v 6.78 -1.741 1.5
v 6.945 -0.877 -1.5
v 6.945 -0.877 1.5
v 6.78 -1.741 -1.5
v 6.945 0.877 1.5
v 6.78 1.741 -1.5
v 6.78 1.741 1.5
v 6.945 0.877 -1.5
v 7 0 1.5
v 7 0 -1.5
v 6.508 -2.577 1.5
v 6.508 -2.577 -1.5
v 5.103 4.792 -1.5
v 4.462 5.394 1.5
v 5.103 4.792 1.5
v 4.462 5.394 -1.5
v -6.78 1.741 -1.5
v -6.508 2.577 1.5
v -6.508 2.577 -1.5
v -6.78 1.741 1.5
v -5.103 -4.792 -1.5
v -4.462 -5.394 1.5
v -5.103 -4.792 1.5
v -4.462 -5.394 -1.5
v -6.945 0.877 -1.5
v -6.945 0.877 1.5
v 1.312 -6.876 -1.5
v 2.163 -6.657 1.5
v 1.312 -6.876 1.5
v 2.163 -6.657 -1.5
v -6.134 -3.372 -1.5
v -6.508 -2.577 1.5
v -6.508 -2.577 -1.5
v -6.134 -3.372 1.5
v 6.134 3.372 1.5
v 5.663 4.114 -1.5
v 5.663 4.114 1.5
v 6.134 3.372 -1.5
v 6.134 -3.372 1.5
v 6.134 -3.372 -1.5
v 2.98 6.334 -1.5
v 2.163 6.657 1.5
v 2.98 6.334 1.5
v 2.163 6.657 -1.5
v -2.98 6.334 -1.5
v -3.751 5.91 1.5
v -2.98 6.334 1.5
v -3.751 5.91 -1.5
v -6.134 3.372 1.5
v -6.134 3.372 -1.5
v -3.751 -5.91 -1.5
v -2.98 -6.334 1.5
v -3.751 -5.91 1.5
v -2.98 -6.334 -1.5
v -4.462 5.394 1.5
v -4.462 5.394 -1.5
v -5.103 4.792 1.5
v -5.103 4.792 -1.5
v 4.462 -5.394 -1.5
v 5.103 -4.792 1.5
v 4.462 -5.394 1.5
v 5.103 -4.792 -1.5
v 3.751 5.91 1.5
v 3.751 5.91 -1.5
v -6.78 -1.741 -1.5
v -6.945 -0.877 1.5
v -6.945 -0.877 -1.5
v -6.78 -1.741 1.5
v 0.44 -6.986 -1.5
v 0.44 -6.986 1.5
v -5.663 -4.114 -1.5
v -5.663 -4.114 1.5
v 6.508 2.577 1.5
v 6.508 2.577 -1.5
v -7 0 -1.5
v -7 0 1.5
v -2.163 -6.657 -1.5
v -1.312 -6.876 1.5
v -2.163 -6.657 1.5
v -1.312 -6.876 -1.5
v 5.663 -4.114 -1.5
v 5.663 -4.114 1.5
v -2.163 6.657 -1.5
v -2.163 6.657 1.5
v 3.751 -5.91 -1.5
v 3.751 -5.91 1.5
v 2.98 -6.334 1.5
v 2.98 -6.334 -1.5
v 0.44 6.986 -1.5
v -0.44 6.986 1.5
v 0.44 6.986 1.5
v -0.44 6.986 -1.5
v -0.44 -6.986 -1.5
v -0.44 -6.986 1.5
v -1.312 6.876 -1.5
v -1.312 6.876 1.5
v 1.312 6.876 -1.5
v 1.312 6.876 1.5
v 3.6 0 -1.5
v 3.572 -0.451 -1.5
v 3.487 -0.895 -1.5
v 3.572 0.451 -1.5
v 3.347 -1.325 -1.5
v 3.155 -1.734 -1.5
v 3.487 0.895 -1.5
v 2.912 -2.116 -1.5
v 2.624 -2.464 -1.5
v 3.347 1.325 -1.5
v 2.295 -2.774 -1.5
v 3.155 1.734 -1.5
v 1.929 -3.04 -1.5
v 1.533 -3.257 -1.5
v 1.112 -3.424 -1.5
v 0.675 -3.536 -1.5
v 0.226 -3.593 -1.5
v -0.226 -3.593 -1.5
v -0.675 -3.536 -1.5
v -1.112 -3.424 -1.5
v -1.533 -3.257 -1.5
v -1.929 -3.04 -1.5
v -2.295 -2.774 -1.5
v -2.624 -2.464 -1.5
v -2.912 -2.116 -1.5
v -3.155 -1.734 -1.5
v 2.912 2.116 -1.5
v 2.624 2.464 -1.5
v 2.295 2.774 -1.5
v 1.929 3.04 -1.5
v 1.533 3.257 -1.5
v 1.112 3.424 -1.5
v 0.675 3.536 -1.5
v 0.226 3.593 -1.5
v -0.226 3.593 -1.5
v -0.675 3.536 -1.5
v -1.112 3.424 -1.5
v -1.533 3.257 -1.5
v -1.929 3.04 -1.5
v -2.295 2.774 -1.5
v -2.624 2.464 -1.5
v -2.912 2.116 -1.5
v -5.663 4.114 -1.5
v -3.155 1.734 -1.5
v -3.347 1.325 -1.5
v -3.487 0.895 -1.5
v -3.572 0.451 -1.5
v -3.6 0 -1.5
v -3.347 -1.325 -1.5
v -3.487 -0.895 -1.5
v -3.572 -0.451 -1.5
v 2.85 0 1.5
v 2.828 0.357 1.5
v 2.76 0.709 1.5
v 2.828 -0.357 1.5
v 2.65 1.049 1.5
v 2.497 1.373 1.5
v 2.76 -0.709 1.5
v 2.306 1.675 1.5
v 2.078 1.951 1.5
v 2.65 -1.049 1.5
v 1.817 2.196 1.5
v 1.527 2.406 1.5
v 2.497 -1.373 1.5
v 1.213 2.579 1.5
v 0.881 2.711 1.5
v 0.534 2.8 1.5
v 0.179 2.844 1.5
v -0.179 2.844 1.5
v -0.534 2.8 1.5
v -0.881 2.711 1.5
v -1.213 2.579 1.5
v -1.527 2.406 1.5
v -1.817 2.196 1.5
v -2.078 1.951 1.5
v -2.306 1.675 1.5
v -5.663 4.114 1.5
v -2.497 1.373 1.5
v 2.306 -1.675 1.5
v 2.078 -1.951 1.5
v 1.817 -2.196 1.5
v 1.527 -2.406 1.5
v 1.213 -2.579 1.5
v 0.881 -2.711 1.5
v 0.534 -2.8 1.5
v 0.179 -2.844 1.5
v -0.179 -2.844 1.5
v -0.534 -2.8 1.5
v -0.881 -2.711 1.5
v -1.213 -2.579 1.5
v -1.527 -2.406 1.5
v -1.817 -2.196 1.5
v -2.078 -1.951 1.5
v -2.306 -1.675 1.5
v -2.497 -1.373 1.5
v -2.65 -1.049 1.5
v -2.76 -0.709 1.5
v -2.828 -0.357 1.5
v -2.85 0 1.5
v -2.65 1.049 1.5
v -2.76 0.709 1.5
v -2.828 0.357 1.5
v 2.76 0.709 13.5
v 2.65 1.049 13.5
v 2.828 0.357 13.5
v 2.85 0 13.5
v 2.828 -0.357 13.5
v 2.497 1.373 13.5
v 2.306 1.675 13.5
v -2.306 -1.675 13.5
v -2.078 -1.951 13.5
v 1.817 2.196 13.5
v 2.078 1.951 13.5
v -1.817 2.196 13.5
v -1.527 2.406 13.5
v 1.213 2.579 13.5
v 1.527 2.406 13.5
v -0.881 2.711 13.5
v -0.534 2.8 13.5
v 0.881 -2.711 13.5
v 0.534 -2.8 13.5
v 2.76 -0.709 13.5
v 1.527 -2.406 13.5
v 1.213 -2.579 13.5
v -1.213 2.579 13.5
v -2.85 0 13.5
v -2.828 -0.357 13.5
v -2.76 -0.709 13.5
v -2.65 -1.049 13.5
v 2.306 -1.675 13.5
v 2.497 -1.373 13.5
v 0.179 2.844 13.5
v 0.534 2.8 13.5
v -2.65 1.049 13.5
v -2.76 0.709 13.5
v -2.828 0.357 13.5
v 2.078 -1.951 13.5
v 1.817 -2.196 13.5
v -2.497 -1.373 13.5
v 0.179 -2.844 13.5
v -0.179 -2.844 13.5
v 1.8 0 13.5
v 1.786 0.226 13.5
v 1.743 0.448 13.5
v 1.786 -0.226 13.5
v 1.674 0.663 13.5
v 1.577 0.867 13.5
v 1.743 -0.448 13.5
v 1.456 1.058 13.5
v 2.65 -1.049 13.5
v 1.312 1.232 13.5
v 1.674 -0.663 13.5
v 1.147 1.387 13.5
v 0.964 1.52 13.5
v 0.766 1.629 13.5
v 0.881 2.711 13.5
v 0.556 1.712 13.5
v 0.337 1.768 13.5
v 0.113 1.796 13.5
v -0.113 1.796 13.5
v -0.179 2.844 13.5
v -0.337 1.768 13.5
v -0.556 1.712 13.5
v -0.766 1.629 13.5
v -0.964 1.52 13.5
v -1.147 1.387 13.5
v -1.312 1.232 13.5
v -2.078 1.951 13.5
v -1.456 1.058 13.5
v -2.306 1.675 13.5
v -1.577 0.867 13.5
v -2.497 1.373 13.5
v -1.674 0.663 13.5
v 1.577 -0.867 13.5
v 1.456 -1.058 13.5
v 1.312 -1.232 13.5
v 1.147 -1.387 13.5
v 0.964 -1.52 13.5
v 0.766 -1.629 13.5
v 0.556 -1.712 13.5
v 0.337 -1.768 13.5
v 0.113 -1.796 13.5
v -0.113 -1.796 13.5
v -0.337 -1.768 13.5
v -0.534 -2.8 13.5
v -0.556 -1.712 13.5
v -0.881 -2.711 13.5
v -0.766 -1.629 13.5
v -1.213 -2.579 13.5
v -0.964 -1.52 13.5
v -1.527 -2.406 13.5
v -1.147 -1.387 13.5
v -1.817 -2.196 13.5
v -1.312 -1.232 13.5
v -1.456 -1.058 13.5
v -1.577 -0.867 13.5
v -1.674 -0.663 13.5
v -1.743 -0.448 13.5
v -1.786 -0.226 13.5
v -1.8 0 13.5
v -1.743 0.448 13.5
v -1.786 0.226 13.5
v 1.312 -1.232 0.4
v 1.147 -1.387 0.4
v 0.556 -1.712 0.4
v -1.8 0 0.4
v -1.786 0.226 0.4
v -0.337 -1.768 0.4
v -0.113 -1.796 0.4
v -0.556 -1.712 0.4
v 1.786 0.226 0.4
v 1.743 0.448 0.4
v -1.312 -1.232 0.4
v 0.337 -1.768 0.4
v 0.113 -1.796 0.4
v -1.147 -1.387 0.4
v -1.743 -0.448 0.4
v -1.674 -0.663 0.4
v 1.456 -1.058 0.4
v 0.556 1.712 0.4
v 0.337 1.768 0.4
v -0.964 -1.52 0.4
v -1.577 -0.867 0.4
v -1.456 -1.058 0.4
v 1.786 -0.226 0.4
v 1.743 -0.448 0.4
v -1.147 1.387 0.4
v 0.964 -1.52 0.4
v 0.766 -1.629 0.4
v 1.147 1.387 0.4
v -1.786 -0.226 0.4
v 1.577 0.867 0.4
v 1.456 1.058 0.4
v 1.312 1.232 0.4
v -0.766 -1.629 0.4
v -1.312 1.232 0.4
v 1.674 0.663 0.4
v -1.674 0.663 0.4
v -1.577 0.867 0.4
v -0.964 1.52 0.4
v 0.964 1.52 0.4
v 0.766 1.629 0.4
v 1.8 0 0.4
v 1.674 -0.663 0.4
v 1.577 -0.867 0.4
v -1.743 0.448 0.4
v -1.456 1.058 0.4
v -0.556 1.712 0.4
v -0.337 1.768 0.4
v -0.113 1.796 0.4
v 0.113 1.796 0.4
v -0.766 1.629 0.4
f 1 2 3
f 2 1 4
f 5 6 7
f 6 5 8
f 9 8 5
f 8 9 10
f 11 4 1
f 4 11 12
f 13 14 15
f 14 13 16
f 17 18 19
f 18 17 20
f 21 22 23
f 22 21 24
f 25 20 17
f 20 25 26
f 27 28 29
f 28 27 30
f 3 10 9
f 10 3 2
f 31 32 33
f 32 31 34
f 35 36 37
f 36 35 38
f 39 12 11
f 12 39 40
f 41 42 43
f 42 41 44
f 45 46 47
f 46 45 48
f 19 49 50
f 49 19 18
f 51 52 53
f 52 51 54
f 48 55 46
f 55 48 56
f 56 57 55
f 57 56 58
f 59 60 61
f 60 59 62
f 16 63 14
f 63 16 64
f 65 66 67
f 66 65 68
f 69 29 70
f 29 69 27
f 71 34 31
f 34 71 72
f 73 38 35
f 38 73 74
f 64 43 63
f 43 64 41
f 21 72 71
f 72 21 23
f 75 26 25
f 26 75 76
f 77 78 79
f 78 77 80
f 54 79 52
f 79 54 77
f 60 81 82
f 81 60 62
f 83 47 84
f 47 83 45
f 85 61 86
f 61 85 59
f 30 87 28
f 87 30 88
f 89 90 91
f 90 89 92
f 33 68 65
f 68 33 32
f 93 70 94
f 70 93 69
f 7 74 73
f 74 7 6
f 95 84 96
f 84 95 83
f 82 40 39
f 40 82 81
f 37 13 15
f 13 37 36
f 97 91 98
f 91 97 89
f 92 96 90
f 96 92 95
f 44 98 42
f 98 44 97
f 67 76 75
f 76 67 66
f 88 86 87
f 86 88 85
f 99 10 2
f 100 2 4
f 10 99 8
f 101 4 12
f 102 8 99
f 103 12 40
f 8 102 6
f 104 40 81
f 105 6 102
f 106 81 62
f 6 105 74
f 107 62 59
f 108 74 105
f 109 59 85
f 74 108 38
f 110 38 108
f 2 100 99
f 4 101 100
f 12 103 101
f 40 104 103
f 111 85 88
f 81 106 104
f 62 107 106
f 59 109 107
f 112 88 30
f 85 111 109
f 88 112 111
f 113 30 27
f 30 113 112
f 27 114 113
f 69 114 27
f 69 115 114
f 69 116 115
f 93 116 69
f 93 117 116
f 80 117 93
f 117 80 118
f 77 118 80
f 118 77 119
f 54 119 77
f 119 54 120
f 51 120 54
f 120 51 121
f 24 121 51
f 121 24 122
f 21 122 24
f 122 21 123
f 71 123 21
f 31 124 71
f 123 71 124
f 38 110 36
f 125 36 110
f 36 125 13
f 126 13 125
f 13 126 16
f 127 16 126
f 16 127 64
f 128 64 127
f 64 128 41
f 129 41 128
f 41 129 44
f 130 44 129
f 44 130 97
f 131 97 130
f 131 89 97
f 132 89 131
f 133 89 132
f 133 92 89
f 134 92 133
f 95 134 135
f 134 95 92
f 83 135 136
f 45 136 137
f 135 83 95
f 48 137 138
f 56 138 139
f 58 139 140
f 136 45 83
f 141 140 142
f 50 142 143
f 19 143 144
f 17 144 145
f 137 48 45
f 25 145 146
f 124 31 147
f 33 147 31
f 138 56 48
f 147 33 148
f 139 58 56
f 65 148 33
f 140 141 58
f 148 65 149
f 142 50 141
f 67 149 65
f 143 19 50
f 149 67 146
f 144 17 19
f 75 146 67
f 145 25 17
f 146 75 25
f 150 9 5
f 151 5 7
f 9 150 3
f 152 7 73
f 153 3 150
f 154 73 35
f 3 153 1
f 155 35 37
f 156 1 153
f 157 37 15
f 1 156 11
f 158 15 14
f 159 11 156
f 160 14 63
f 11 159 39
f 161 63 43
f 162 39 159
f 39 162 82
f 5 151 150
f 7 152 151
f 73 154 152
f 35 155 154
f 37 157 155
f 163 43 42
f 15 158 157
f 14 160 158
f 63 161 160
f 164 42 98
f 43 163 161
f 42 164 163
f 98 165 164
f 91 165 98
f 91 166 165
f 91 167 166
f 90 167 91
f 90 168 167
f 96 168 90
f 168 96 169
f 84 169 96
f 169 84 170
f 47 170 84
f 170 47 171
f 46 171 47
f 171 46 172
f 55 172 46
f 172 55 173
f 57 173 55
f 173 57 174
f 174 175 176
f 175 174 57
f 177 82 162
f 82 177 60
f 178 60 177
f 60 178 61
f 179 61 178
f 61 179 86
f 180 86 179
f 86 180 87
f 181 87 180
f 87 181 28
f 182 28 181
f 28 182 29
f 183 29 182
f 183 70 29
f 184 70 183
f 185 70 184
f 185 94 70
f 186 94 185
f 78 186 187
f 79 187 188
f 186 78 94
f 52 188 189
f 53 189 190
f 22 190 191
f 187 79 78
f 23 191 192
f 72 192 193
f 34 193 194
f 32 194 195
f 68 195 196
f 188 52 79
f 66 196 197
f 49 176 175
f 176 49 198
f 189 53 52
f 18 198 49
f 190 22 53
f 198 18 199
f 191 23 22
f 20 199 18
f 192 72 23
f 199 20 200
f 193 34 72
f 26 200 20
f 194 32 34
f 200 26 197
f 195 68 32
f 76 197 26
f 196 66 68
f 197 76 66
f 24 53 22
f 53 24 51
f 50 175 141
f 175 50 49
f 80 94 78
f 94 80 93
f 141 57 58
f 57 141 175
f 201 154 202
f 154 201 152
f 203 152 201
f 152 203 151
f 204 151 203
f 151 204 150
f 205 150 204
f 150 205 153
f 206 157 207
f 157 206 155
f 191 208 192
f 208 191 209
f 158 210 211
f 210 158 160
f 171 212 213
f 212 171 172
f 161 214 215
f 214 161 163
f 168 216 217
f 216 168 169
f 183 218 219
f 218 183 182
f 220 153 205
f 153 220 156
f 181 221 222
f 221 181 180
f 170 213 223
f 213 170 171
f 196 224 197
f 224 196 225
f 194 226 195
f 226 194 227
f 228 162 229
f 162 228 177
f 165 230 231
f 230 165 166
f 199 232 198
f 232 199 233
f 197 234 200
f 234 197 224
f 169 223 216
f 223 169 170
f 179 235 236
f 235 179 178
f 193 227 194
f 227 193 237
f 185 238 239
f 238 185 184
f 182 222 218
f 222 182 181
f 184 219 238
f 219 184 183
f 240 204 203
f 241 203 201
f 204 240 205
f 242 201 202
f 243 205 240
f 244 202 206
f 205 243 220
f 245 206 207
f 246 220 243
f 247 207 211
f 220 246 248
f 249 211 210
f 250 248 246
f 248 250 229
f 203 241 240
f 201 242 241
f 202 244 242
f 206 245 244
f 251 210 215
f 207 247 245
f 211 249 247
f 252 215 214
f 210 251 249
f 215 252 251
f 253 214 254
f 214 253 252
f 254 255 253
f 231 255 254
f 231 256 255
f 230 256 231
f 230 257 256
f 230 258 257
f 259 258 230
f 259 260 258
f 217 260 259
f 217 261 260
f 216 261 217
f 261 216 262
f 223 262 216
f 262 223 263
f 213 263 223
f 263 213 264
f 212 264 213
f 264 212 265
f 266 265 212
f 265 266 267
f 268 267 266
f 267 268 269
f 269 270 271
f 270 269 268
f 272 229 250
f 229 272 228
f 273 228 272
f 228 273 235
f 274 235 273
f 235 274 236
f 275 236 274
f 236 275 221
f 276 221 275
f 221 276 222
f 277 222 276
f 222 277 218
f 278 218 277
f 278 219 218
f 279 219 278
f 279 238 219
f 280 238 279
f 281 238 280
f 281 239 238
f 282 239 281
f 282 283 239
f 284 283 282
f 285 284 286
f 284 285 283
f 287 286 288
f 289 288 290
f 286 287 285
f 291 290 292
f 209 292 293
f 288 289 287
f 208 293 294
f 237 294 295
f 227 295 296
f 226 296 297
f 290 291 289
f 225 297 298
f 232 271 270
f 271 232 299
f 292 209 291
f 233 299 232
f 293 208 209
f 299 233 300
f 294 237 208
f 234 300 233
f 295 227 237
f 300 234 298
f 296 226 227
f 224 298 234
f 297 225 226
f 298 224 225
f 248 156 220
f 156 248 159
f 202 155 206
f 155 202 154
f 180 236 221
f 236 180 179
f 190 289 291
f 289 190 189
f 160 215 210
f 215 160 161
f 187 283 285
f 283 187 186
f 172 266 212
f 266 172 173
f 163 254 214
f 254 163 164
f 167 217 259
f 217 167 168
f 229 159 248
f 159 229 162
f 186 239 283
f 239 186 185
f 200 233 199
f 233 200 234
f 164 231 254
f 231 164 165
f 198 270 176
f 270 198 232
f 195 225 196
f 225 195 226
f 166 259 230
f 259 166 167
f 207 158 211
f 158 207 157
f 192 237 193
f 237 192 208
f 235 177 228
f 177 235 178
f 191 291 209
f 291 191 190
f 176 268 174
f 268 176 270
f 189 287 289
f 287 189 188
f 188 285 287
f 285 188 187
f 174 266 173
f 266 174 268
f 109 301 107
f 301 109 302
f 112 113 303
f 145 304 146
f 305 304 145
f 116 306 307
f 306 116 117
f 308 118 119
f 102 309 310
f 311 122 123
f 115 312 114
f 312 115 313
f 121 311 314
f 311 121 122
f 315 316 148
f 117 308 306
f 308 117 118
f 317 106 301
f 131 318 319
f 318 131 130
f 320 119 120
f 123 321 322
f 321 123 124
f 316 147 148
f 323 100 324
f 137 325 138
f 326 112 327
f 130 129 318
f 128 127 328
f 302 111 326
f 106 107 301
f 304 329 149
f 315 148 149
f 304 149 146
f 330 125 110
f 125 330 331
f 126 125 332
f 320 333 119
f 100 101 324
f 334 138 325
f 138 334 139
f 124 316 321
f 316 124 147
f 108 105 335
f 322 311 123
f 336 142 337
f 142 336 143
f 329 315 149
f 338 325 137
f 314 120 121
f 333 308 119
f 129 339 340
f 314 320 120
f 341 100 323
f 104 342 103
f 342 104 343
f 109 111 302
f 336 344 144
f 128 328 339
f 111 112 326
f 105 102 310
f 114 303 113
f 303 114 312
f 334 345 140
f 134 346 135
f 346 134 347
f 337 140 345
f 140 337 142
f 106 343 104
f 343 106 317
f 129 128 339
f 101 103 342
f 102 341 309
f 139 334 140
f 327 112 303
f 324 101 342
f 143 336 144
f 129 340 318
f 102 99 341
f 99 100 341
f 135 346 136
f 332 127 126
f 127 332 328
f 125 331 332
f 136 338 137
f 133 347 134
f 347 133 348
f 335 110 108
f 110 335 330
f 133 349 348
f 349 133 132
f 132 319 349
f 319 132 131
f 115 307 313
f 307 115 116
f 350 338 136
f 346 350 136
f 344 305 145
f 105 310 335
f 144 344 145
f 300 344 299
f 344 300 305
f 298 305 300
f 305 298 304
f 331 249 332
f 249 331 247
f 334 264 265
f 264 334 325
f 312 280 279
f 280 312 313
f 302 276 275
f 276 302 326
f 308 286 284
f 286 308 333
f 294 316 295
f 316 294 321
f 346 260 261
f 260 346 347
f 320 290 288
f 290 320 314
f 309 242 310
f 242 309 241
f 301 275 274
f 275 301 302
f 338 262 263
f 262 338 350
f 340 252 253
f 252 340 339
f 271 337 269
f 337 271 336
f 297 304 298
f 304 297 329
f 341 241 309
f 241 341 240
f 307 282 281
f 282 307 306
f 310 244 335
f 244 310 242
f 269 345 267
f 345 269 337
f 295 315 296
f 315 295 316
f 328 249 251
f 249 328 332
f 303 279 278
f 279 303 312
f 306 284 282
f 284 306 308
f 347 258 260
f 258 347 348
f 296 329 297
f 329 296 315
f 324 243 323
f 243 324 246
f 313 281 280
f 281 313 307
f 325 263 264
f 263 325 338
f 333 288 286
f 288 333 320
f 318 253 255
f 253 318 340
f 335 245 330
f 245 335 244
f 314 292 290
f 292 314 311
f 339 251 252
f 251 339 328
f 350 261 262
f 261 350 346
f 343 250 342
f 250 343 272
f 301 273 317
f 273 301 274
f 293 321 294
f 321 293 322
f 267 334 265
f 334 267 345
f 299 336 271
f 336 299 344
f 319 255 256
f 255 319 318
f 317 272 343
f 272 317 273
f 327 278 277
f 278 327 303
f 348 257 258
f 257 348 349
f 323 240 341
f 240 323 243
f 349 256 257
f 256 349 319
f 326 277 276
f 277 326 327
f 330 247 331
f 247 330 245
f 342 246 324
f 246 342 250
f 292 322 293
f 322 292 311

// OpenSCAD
$fn = 50;


difference() {
	union() {
		translate(v = [0, 0, -1.5000000000]) {
			cylinder(h = 3, r = 7.0000000000);
		}
		translate(v = [0, 0, -1.5000000000]) {
			cylinder(h = 15, r = 2.8500000000);
		}
	}
	union() {
		translate(v = [0, 0, -1.5000000000]) {
			rotate(a = [0, 180, 0]) {
				difference() {
					union() {
						translate(v = [0, 0, -15.0000000000]) {
							cylinder(h = 15, r = 1.5000000000);
						}
						translate(v = [0, 0, -1.9000000000]) {
							cylinder(h = 1.9000000000, r1 = 1.8000000000, r2 = 3.6000000000);
						}
						translate(v = [0, 0, -15.0000000000]) {
							cylinder(h = 15, r = 1.8000000000);
						}
						translate(v = [0, 0, -15.0000000000]) {
							cylinder(h = 15, r = 1.5000000000);
						}
					}
					union();
				}
			}
		}
		translate(v = [0, 0, -100.0000000000]) {
			cylinder(h = 200, r = 1.8000000000);
		}
	}
}
